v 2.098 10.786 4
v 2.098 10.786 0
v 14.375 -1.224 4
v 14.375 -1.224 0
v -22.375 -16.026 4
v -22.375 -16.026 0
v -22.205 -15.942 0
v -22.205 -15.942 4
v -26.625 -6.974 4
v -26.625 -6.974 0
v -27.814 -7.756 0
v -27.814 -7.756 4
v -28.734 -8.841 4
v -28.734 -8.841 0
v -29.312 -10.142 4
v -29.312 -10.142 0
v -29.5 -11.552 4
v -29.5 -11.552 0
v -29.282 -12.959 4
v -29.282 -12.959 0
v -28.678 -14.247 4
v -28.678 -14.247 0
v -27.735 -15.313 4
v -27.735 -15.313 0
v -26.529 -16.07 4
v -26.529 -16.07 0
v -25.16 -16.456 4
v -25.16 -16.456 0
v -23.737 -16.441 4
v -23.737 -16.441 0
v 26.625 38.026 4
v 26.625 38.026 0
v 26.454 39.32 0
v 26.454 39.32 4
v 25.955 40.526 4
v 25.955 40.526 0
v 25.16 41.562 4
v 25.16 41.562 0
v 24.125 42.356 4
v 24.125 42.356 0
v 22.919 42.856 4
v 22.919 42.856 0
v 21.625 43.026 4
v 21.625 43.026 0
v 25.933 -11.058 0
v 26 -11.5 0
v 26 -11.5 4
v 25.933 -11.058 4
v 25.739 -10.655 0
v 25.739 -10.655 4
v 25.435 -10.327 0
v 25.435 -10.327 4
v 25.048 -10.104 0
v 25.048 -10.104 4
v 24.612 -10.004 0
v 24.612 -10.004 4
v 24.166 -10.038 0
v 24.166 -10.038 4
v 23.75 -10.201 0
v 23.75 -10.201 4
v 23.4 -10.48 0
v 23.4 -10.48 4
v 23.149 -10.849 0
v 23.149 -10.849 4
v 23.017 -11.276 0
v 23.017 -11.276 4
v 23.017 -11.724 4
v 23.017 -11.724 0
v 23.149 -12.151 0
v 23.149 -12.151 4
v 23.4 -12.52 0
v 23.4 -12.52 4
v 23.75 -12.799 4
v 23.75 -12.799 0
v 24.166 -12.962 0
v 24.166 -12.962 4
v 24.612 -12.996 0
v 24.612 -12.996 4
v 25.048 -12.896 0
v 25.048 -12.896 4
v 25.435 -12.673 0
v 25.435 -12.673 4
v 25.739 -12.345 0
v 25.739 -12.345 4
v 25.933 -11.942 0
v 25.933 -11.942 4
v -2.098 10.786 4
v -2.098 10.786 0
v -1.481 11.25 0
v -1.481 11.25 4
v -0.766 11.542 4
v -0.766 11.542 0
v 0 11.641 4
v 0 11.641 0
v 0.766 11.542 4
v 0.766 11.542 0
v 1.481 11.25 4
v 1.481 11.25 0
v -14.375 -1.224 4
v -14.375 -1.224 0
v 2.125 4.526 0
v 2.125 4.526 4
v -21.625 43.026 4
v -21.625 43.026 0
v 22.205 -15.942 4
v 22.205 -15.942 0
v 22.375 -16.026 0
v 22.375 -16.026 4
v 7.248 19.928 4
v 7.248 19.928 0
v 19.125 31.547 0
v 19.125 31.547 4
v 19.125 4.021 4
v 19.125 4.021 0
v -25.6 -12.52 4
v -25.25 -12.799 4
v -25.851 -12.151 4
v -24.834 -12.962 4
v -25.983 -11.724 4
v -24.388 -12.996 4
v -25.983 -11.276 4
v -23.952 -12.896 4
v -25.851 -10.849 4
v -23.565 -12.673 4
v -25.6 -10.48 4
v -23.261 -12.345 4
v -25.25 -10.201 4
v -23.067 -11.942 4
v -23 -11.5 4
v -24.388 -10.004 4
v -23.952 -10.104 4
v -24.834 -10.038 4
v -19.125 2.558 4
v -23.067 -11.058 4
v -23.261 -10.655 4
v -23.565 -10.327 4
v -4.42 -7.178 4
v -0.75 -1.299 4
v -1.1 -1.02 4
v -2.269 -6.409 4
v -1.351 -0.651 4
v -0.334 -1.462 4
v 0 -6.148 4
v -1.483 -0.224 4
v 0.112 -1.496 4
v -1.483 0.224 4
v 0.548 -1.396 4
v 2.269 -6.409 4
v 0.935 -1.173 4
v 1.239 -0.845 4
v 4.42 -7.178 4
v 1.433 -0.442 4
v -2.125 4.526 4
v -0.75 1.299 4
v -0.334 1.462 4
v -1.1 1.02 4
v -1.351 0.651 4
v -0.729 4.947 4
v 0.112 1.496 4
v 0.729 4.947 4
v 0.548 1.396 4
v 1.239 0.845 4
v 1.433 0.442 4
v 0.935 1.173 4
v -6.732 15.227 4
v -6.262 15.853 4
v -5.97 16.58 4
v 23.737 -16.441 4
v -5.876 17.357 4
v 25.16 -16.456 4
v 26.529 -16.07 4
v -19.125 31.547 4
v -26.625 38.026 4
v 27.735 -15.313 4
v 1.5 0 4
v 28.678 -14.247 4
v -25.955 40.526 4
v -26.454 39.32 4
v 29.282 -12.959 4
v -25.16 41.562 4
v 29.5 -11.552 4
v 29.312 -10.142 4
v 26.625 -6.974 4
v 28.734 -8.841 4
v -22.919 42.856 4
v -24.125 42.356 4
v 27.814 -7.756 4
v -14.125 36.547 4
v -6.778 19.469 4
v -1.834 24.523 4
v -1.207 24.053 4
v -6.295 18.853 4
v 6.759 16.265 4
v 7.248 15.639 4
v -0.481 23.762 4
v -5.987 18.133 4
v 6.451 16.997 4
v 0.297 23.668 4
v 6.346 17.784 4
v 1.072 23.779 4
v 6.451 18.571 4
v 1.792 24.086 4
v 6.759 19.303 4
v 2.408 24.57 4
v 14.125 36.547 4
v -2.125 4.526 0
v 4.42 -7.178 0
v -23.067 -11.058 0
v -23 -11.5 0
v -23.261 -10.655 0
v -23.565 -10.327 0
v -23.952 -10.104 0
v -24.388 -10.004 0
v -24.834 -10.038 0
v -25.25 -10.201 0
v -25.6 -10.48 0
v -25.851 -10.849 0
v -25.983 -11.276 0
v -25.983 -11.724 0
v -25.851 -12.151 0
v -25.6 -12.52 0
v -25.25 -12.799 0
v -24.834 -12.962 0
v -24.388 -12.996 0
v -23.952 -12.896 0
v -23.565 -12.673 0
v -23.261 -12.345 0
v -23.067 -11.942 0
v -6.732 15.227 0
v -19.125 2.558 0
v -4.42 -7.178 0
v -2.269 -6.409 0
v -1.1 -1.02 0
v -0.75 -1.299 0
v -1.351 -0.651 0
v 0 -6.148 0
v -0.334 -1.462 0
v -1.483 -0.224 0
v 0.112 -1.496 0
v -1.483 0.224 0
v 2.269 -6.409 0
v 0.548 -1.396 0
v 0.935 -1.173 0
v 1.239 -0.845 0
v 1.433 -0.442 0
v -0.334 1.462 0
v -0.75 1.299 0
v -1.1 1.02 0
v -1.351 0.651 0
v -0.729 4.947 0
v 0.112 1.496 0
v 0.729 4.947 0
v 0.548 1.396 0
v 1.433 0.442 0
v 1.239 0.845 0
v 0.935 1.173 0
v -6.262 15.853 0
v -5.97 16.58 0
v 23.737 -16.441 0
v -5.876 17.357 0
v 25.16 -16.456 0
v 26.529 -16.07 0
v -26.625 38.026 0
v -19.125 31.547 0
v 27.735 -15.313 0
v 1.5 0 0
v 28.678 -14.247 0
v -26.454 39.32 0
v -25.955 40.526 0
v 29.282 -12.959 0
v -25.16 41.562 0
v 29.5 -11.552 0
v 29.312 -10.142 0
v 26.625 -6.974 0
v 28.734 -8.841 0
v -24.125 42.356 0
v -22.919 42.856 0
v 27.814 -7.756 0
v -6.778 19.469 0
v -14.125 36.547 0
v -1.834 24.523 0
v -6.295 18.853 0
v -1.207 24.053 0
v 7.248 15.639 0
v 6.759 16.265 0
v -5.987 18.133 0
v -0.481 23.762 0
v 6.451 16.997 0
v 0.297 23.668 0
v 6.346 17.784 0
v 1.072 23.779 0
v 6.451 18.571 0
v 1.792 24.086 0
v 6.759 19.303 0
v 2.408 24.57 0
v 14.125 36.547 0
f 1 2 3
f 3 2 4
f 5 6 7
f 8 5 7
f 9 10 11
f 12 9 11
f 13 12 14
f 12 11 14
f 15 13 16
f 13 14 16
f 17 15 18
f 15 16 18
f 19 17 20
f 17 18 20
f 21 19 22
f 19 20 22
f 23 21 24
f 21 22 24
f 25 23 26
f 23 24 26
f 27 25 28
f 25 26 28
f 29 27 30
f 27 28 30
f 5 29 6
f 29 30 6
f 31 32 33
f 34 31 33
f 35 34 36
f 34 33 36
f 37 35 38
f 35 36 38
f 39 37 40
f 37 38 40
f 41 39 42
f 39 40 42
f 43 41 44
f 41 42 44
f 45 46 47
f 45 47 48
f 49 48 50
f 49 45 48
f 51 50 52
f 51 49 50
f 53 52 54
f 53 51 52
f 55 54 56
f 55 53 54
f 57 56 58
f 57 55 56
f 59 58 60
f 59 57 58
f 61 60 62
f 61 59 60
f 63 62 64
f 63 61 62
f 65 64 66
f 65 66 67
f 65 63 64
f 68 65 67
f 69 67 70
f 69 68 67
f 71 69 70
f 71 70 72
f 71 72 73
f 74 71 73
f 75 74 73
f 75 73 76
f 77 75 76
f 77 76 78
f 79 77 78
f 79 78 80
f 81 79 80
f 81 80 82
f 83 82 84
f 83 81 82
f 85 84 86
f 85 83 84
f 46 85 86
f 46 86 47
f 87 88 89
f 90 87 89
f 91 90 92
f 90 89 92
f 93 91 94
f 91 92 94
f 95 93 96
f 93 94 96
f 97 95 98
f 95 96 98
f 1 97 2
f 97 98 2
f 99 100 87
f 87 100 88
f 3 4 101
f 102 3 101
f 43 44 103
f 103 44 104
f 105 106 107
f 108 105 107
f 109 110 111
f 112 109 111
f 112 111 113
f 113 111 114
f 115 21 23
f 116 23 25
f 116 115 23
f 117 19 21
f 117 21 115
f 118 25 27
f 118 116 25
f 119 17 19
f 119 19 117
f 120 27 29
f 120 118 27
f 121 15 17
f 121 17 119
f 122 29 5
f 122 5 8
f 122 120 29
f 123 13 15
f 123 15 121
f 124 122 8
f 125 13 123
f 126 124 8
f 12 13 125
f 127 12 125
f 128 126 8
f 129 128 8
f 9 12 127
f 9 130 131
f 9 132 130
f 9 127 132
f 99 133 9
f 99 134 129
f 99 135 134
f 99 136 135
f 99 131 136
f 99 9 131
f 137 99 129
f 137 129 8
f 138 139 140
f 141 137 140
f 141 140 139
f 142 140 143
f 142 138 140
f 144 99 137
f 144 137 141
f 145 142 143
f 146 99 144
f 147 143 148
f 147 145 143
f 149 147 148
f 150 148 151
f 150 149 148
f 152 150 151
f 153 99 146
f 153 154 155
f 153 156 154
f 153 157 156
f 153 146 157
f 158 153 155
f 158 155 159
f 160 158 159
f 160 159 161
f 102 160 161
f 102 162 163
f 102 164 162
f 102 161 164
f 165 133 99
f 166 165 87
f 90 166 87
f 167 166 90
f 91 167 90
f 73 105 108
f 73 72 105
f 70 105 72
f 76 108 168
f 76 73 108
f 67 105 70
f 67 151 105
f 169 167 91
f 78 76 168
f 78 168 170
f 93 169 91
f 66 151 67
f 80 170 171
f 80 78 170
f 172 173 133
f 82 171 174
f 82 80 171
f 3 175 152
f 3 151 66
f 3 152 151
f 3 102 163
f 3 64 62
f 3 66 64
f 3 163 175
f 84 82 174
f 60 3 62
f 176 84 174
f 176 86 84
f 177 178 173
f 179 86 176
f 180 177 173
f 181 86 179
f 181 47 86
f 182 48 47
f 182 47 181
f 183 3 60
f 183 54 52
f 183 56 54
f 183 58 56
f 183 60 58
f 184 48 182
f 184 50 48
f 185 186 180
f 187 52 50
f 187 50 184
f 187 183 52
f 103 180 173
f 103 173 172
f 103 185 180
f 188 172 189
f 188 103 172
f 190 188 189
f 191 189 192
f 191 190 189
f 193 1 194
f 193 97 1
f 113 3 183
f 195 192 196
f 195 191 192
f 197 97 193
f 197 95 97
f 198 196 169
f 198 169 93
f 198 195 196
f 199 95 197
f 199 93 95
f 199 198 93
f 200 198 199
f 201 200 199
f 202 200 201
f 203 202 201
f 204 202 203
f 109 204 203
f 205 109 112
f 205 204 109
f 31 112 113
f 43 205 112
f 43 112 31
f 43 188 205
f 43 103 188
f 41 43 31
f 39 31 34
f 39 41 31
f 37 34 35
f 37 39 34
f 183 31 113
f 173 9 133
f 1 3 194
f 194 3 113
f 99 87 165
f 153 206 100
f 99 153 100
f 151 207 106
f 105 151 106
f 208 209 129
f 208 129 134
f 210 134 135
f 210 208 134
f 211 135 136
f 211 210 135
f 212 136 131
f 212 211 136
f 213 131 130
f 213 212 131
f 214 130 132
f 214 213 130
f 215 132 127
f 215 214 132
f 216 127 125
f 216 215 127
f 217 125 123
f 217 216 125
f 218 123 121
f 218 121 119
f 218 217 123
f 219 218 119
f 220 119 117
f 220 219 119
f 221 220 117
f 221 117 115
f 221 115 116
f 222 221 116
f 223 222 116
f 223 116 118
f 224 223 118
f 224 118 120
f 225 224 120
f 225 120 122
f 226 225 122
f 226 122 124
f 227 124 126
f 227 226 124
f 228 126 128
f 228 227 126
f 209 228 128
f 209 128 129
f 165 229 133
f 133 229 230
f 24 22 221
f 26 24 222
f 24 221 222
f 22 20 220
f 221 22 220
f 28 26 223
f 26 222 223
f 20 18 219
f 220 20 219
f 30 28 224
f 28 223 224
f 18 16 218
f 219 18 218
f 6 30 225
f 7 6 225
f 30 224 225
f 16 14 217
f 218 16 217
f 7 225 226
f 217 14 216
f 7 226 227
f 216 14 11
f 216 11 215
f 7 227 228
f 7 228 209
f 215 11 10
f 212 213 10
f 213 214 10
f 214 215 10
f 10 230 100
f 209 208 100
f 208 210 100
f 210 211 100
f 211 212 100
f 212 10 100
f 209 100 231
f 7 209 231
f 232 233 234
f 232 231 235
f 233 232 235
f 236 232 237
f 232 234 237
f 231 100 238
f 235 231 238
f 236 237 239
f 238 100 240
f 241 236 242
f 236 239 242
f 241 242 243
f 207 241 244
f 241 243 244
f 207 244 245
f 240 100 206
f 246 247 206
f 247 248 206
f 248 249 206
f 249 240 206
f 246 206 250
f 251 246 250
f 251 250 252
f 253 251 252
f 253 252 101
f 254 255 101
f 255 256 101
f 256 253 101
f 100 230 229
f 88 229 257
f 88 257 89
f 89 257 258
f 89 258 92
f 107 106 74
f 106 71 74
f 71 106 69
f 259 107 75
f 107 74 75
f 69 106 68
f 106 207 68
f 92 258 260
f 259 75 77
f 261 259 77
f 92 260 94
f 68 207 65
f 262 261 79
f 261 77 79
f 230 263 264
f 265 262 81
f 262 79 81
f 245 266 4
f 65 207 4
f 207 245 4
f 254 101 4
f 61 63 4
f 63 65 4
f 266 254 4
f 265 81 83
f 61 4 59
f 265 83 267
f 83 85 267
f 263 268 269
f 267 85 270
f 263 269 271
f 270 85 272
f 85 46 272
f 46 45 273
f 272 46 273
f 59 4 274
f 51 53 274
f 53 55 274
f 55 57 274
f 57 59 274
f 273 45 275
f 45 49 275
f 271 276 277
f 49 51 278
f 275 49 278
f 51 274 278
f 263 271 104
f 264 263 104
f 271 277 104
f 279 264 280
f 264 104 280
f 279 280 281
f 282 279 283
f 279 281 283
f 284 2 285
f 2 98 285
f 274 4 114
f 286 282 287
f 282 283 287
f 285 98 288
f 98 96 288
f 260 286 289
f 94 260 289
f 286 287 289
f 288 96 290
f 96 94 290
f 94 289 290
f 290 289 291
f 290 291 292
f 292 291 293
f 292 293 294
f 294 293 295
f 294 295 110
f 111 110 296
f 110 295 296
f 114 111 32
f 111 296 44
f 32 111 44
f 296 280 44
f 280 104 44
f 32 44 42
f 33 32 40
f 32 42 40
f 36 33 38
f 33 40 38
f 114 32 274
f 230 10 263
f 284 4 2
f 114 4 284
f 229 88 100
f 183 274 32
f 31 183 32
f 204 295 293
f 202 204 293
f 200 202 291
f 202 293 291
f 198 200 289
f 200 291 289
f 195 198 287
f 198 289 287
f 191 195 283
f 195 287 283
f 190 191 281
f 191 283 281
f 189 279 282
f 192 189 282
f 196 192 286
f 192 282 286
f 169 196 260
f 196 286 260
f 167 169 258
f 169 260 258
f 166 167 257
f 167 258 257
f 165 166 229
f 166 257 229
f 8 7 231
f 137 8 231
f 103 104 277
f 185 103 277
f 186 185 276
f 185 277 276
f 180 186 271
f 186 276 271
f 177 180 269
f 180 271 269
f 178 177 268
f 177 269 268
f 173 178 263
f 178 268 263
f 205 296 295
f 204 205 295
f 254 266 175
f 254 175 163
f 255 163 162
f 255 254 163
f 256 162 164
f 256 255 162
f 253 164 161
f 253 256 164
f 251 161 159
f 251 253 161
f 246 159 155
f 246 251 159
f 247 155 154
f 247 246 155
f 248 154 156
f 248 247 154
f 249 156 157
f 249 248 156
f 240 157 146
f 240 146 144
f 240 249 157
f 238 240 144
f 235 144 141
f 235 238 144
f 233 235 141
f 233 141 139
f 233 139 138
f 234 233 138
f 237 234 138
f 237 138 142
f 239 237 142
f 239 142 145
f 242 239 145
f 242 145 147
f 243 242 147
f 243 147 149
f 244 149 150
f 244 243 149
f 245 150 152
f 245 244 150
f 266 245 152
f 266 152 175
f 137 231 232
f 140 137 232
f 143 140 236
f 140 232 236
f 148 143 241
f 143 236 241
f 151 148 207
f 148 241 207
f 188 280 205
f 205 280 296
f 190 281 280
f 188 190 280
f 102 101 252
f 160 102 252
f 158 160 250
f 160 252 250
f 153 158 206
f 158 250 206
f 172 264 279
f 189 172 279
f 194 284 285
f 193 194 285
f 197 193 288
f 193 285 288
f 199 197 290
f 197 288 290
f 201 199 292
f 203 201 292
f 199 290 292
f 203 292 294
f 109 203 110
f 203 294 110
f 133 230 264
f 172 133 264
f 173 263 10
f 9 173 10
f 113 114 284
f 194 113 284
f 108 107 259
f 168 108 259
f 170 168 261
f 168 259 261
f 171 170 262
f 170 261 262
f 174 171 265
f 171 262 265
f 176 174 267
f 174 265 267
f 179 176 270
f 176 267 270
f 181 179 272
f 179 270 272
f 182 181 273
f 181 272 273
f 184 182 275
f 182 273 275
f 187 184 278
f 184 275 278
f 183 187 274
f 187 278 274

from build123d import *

# Parameters (mm, degrees)
SKETCH1_R           = 1.5
BOSS_EXTRUDE1_DEPTH = 4


with BuildPart() as part:
    # Sketch1 → Boss-Extrude1 (new body)
    with BuildSketch(Plane.XY):
        with BuildLine():
            ThreePointArc((-26.624535685, -6.97381528), (-29.02618472, -13.624535685), (-22.375464315, -16.02618472))
            Line((-22.375464315, -16.02618472), (-22.205082013, -15.942223704))
            Line((-22.205082013, -15.942223704), (-4.420251148, -7.178212035))
            ThreePointArc((-4.420251148, -7.178212035), (0, -6.148238779), (4.420251148, -7.178212035))
            Line((4.420251148, -7.178212035), (22.205082013, -15.942223704))
            Line((22.205082013, -15.942223704), (22.375464315, -16.02618472))
            ThreePointArc((22.375464315, -16.02618472), (29.02618472, -13.624535685), (26.624535685, -6.97381528))
            Line((26.624535685, -6.97381528), (26.624535685, 38.02618472))
            ThreePointArc((26.624535685, 38.02618472), (25.160069591, 41.561718626), (21.624535685, 43.02618472))
            Line((21.624535685, 43.02618472), (-21.624535685, 43.02618472))
            ThreePointArc((-21.624535685, 43.02618472), (-25.160069591, 41.561718626), (-26.624535685, 38.02618472))
            Line((-26.624535685, 38.02618472), (-26.624535685, -6.97381528))
        make_face()
        with Locations((-24.5, -11.5)):
            Circle(SKETCH1_R, mode=Mode.SUBTRACT)
        with Locations((24.5, -11.5)):
            Circle(SKETCH1_R, mode=Mode.SUBTRACT)
        Circle(SKETCH1_R, mode=Mode.SUBTRACT)
        with BuildLine():
            Line((14.374535685, -1.22381528), (2.124535685, 4.52618472))
            ThreePointArc((2.124535685, 4.52618472), (0, 5), (-2.124535685, 4.52618472))
            Line((-2.124535685, 4.52618472), (-14.374535685, -1.22381528))
            Line((-14.374535685, -1.22381528), (-2.097868645, 10.785812849))
            ThreePointArc((-2.097868645, 10.785812849), (0, 11.641297251), (2.097868645, 10.785812849))
            Line((2.097868645, 10.785812849), (14.374535685, -1.22381528))
        make_face(mode=Mode.SUBTRACT)
        with BuildLine():
            Line((-6.73171968, 15.226590291), (-19.124535685, 2.558215038))
            Line((-19.124535685, 2.558215038), (-19.124535685, 31.546592884))
            Line((-19.124535685, 31.546592884), (-6.778366633, 19.468974534))
            ThreePointArc((-6.778366633, 19.468974534), (-5.876416612, 17.357443313), (-6.73171968, 15.226590291))
        make_face(mode=Mode.SUBTRACT)
        with BuildLine():
            Line((19.124535685, 31.546592884), (19.124535685, 4.020746784))
            Line((19.124535685, 4.020746784), (7.24778827, 15.639154236))
            ThreePointArc((7.24778827, 15.639154236), (6.345656915, 17.783669834), (7.24778827, 19.928185432))
            Line((7.24778827, 19.928185432), (19.124535685, 31.546592884))
        make_face(mode=Mode.SUBTRACT)
        with BuildLine():
            Line((-1.833941699, 24.523340745), (-14.124535685, 36.546592884))
            Line((-14.124535685, 36.546592884), (14.124535685, 36.546592884))
            Line((14.124535685, 36.546592884), (2.408442543, 24.569987698))
            ThreePointArc((2.408442543, 24.569987698), (0.296911322, 23.668037677), (-1.833941699, 24.523340745))
        make_face(mode=Mode.SUBTRACT)
    extrude(amount=BOSS_EXTRUDE1_DEPTH)


solid = part.part
